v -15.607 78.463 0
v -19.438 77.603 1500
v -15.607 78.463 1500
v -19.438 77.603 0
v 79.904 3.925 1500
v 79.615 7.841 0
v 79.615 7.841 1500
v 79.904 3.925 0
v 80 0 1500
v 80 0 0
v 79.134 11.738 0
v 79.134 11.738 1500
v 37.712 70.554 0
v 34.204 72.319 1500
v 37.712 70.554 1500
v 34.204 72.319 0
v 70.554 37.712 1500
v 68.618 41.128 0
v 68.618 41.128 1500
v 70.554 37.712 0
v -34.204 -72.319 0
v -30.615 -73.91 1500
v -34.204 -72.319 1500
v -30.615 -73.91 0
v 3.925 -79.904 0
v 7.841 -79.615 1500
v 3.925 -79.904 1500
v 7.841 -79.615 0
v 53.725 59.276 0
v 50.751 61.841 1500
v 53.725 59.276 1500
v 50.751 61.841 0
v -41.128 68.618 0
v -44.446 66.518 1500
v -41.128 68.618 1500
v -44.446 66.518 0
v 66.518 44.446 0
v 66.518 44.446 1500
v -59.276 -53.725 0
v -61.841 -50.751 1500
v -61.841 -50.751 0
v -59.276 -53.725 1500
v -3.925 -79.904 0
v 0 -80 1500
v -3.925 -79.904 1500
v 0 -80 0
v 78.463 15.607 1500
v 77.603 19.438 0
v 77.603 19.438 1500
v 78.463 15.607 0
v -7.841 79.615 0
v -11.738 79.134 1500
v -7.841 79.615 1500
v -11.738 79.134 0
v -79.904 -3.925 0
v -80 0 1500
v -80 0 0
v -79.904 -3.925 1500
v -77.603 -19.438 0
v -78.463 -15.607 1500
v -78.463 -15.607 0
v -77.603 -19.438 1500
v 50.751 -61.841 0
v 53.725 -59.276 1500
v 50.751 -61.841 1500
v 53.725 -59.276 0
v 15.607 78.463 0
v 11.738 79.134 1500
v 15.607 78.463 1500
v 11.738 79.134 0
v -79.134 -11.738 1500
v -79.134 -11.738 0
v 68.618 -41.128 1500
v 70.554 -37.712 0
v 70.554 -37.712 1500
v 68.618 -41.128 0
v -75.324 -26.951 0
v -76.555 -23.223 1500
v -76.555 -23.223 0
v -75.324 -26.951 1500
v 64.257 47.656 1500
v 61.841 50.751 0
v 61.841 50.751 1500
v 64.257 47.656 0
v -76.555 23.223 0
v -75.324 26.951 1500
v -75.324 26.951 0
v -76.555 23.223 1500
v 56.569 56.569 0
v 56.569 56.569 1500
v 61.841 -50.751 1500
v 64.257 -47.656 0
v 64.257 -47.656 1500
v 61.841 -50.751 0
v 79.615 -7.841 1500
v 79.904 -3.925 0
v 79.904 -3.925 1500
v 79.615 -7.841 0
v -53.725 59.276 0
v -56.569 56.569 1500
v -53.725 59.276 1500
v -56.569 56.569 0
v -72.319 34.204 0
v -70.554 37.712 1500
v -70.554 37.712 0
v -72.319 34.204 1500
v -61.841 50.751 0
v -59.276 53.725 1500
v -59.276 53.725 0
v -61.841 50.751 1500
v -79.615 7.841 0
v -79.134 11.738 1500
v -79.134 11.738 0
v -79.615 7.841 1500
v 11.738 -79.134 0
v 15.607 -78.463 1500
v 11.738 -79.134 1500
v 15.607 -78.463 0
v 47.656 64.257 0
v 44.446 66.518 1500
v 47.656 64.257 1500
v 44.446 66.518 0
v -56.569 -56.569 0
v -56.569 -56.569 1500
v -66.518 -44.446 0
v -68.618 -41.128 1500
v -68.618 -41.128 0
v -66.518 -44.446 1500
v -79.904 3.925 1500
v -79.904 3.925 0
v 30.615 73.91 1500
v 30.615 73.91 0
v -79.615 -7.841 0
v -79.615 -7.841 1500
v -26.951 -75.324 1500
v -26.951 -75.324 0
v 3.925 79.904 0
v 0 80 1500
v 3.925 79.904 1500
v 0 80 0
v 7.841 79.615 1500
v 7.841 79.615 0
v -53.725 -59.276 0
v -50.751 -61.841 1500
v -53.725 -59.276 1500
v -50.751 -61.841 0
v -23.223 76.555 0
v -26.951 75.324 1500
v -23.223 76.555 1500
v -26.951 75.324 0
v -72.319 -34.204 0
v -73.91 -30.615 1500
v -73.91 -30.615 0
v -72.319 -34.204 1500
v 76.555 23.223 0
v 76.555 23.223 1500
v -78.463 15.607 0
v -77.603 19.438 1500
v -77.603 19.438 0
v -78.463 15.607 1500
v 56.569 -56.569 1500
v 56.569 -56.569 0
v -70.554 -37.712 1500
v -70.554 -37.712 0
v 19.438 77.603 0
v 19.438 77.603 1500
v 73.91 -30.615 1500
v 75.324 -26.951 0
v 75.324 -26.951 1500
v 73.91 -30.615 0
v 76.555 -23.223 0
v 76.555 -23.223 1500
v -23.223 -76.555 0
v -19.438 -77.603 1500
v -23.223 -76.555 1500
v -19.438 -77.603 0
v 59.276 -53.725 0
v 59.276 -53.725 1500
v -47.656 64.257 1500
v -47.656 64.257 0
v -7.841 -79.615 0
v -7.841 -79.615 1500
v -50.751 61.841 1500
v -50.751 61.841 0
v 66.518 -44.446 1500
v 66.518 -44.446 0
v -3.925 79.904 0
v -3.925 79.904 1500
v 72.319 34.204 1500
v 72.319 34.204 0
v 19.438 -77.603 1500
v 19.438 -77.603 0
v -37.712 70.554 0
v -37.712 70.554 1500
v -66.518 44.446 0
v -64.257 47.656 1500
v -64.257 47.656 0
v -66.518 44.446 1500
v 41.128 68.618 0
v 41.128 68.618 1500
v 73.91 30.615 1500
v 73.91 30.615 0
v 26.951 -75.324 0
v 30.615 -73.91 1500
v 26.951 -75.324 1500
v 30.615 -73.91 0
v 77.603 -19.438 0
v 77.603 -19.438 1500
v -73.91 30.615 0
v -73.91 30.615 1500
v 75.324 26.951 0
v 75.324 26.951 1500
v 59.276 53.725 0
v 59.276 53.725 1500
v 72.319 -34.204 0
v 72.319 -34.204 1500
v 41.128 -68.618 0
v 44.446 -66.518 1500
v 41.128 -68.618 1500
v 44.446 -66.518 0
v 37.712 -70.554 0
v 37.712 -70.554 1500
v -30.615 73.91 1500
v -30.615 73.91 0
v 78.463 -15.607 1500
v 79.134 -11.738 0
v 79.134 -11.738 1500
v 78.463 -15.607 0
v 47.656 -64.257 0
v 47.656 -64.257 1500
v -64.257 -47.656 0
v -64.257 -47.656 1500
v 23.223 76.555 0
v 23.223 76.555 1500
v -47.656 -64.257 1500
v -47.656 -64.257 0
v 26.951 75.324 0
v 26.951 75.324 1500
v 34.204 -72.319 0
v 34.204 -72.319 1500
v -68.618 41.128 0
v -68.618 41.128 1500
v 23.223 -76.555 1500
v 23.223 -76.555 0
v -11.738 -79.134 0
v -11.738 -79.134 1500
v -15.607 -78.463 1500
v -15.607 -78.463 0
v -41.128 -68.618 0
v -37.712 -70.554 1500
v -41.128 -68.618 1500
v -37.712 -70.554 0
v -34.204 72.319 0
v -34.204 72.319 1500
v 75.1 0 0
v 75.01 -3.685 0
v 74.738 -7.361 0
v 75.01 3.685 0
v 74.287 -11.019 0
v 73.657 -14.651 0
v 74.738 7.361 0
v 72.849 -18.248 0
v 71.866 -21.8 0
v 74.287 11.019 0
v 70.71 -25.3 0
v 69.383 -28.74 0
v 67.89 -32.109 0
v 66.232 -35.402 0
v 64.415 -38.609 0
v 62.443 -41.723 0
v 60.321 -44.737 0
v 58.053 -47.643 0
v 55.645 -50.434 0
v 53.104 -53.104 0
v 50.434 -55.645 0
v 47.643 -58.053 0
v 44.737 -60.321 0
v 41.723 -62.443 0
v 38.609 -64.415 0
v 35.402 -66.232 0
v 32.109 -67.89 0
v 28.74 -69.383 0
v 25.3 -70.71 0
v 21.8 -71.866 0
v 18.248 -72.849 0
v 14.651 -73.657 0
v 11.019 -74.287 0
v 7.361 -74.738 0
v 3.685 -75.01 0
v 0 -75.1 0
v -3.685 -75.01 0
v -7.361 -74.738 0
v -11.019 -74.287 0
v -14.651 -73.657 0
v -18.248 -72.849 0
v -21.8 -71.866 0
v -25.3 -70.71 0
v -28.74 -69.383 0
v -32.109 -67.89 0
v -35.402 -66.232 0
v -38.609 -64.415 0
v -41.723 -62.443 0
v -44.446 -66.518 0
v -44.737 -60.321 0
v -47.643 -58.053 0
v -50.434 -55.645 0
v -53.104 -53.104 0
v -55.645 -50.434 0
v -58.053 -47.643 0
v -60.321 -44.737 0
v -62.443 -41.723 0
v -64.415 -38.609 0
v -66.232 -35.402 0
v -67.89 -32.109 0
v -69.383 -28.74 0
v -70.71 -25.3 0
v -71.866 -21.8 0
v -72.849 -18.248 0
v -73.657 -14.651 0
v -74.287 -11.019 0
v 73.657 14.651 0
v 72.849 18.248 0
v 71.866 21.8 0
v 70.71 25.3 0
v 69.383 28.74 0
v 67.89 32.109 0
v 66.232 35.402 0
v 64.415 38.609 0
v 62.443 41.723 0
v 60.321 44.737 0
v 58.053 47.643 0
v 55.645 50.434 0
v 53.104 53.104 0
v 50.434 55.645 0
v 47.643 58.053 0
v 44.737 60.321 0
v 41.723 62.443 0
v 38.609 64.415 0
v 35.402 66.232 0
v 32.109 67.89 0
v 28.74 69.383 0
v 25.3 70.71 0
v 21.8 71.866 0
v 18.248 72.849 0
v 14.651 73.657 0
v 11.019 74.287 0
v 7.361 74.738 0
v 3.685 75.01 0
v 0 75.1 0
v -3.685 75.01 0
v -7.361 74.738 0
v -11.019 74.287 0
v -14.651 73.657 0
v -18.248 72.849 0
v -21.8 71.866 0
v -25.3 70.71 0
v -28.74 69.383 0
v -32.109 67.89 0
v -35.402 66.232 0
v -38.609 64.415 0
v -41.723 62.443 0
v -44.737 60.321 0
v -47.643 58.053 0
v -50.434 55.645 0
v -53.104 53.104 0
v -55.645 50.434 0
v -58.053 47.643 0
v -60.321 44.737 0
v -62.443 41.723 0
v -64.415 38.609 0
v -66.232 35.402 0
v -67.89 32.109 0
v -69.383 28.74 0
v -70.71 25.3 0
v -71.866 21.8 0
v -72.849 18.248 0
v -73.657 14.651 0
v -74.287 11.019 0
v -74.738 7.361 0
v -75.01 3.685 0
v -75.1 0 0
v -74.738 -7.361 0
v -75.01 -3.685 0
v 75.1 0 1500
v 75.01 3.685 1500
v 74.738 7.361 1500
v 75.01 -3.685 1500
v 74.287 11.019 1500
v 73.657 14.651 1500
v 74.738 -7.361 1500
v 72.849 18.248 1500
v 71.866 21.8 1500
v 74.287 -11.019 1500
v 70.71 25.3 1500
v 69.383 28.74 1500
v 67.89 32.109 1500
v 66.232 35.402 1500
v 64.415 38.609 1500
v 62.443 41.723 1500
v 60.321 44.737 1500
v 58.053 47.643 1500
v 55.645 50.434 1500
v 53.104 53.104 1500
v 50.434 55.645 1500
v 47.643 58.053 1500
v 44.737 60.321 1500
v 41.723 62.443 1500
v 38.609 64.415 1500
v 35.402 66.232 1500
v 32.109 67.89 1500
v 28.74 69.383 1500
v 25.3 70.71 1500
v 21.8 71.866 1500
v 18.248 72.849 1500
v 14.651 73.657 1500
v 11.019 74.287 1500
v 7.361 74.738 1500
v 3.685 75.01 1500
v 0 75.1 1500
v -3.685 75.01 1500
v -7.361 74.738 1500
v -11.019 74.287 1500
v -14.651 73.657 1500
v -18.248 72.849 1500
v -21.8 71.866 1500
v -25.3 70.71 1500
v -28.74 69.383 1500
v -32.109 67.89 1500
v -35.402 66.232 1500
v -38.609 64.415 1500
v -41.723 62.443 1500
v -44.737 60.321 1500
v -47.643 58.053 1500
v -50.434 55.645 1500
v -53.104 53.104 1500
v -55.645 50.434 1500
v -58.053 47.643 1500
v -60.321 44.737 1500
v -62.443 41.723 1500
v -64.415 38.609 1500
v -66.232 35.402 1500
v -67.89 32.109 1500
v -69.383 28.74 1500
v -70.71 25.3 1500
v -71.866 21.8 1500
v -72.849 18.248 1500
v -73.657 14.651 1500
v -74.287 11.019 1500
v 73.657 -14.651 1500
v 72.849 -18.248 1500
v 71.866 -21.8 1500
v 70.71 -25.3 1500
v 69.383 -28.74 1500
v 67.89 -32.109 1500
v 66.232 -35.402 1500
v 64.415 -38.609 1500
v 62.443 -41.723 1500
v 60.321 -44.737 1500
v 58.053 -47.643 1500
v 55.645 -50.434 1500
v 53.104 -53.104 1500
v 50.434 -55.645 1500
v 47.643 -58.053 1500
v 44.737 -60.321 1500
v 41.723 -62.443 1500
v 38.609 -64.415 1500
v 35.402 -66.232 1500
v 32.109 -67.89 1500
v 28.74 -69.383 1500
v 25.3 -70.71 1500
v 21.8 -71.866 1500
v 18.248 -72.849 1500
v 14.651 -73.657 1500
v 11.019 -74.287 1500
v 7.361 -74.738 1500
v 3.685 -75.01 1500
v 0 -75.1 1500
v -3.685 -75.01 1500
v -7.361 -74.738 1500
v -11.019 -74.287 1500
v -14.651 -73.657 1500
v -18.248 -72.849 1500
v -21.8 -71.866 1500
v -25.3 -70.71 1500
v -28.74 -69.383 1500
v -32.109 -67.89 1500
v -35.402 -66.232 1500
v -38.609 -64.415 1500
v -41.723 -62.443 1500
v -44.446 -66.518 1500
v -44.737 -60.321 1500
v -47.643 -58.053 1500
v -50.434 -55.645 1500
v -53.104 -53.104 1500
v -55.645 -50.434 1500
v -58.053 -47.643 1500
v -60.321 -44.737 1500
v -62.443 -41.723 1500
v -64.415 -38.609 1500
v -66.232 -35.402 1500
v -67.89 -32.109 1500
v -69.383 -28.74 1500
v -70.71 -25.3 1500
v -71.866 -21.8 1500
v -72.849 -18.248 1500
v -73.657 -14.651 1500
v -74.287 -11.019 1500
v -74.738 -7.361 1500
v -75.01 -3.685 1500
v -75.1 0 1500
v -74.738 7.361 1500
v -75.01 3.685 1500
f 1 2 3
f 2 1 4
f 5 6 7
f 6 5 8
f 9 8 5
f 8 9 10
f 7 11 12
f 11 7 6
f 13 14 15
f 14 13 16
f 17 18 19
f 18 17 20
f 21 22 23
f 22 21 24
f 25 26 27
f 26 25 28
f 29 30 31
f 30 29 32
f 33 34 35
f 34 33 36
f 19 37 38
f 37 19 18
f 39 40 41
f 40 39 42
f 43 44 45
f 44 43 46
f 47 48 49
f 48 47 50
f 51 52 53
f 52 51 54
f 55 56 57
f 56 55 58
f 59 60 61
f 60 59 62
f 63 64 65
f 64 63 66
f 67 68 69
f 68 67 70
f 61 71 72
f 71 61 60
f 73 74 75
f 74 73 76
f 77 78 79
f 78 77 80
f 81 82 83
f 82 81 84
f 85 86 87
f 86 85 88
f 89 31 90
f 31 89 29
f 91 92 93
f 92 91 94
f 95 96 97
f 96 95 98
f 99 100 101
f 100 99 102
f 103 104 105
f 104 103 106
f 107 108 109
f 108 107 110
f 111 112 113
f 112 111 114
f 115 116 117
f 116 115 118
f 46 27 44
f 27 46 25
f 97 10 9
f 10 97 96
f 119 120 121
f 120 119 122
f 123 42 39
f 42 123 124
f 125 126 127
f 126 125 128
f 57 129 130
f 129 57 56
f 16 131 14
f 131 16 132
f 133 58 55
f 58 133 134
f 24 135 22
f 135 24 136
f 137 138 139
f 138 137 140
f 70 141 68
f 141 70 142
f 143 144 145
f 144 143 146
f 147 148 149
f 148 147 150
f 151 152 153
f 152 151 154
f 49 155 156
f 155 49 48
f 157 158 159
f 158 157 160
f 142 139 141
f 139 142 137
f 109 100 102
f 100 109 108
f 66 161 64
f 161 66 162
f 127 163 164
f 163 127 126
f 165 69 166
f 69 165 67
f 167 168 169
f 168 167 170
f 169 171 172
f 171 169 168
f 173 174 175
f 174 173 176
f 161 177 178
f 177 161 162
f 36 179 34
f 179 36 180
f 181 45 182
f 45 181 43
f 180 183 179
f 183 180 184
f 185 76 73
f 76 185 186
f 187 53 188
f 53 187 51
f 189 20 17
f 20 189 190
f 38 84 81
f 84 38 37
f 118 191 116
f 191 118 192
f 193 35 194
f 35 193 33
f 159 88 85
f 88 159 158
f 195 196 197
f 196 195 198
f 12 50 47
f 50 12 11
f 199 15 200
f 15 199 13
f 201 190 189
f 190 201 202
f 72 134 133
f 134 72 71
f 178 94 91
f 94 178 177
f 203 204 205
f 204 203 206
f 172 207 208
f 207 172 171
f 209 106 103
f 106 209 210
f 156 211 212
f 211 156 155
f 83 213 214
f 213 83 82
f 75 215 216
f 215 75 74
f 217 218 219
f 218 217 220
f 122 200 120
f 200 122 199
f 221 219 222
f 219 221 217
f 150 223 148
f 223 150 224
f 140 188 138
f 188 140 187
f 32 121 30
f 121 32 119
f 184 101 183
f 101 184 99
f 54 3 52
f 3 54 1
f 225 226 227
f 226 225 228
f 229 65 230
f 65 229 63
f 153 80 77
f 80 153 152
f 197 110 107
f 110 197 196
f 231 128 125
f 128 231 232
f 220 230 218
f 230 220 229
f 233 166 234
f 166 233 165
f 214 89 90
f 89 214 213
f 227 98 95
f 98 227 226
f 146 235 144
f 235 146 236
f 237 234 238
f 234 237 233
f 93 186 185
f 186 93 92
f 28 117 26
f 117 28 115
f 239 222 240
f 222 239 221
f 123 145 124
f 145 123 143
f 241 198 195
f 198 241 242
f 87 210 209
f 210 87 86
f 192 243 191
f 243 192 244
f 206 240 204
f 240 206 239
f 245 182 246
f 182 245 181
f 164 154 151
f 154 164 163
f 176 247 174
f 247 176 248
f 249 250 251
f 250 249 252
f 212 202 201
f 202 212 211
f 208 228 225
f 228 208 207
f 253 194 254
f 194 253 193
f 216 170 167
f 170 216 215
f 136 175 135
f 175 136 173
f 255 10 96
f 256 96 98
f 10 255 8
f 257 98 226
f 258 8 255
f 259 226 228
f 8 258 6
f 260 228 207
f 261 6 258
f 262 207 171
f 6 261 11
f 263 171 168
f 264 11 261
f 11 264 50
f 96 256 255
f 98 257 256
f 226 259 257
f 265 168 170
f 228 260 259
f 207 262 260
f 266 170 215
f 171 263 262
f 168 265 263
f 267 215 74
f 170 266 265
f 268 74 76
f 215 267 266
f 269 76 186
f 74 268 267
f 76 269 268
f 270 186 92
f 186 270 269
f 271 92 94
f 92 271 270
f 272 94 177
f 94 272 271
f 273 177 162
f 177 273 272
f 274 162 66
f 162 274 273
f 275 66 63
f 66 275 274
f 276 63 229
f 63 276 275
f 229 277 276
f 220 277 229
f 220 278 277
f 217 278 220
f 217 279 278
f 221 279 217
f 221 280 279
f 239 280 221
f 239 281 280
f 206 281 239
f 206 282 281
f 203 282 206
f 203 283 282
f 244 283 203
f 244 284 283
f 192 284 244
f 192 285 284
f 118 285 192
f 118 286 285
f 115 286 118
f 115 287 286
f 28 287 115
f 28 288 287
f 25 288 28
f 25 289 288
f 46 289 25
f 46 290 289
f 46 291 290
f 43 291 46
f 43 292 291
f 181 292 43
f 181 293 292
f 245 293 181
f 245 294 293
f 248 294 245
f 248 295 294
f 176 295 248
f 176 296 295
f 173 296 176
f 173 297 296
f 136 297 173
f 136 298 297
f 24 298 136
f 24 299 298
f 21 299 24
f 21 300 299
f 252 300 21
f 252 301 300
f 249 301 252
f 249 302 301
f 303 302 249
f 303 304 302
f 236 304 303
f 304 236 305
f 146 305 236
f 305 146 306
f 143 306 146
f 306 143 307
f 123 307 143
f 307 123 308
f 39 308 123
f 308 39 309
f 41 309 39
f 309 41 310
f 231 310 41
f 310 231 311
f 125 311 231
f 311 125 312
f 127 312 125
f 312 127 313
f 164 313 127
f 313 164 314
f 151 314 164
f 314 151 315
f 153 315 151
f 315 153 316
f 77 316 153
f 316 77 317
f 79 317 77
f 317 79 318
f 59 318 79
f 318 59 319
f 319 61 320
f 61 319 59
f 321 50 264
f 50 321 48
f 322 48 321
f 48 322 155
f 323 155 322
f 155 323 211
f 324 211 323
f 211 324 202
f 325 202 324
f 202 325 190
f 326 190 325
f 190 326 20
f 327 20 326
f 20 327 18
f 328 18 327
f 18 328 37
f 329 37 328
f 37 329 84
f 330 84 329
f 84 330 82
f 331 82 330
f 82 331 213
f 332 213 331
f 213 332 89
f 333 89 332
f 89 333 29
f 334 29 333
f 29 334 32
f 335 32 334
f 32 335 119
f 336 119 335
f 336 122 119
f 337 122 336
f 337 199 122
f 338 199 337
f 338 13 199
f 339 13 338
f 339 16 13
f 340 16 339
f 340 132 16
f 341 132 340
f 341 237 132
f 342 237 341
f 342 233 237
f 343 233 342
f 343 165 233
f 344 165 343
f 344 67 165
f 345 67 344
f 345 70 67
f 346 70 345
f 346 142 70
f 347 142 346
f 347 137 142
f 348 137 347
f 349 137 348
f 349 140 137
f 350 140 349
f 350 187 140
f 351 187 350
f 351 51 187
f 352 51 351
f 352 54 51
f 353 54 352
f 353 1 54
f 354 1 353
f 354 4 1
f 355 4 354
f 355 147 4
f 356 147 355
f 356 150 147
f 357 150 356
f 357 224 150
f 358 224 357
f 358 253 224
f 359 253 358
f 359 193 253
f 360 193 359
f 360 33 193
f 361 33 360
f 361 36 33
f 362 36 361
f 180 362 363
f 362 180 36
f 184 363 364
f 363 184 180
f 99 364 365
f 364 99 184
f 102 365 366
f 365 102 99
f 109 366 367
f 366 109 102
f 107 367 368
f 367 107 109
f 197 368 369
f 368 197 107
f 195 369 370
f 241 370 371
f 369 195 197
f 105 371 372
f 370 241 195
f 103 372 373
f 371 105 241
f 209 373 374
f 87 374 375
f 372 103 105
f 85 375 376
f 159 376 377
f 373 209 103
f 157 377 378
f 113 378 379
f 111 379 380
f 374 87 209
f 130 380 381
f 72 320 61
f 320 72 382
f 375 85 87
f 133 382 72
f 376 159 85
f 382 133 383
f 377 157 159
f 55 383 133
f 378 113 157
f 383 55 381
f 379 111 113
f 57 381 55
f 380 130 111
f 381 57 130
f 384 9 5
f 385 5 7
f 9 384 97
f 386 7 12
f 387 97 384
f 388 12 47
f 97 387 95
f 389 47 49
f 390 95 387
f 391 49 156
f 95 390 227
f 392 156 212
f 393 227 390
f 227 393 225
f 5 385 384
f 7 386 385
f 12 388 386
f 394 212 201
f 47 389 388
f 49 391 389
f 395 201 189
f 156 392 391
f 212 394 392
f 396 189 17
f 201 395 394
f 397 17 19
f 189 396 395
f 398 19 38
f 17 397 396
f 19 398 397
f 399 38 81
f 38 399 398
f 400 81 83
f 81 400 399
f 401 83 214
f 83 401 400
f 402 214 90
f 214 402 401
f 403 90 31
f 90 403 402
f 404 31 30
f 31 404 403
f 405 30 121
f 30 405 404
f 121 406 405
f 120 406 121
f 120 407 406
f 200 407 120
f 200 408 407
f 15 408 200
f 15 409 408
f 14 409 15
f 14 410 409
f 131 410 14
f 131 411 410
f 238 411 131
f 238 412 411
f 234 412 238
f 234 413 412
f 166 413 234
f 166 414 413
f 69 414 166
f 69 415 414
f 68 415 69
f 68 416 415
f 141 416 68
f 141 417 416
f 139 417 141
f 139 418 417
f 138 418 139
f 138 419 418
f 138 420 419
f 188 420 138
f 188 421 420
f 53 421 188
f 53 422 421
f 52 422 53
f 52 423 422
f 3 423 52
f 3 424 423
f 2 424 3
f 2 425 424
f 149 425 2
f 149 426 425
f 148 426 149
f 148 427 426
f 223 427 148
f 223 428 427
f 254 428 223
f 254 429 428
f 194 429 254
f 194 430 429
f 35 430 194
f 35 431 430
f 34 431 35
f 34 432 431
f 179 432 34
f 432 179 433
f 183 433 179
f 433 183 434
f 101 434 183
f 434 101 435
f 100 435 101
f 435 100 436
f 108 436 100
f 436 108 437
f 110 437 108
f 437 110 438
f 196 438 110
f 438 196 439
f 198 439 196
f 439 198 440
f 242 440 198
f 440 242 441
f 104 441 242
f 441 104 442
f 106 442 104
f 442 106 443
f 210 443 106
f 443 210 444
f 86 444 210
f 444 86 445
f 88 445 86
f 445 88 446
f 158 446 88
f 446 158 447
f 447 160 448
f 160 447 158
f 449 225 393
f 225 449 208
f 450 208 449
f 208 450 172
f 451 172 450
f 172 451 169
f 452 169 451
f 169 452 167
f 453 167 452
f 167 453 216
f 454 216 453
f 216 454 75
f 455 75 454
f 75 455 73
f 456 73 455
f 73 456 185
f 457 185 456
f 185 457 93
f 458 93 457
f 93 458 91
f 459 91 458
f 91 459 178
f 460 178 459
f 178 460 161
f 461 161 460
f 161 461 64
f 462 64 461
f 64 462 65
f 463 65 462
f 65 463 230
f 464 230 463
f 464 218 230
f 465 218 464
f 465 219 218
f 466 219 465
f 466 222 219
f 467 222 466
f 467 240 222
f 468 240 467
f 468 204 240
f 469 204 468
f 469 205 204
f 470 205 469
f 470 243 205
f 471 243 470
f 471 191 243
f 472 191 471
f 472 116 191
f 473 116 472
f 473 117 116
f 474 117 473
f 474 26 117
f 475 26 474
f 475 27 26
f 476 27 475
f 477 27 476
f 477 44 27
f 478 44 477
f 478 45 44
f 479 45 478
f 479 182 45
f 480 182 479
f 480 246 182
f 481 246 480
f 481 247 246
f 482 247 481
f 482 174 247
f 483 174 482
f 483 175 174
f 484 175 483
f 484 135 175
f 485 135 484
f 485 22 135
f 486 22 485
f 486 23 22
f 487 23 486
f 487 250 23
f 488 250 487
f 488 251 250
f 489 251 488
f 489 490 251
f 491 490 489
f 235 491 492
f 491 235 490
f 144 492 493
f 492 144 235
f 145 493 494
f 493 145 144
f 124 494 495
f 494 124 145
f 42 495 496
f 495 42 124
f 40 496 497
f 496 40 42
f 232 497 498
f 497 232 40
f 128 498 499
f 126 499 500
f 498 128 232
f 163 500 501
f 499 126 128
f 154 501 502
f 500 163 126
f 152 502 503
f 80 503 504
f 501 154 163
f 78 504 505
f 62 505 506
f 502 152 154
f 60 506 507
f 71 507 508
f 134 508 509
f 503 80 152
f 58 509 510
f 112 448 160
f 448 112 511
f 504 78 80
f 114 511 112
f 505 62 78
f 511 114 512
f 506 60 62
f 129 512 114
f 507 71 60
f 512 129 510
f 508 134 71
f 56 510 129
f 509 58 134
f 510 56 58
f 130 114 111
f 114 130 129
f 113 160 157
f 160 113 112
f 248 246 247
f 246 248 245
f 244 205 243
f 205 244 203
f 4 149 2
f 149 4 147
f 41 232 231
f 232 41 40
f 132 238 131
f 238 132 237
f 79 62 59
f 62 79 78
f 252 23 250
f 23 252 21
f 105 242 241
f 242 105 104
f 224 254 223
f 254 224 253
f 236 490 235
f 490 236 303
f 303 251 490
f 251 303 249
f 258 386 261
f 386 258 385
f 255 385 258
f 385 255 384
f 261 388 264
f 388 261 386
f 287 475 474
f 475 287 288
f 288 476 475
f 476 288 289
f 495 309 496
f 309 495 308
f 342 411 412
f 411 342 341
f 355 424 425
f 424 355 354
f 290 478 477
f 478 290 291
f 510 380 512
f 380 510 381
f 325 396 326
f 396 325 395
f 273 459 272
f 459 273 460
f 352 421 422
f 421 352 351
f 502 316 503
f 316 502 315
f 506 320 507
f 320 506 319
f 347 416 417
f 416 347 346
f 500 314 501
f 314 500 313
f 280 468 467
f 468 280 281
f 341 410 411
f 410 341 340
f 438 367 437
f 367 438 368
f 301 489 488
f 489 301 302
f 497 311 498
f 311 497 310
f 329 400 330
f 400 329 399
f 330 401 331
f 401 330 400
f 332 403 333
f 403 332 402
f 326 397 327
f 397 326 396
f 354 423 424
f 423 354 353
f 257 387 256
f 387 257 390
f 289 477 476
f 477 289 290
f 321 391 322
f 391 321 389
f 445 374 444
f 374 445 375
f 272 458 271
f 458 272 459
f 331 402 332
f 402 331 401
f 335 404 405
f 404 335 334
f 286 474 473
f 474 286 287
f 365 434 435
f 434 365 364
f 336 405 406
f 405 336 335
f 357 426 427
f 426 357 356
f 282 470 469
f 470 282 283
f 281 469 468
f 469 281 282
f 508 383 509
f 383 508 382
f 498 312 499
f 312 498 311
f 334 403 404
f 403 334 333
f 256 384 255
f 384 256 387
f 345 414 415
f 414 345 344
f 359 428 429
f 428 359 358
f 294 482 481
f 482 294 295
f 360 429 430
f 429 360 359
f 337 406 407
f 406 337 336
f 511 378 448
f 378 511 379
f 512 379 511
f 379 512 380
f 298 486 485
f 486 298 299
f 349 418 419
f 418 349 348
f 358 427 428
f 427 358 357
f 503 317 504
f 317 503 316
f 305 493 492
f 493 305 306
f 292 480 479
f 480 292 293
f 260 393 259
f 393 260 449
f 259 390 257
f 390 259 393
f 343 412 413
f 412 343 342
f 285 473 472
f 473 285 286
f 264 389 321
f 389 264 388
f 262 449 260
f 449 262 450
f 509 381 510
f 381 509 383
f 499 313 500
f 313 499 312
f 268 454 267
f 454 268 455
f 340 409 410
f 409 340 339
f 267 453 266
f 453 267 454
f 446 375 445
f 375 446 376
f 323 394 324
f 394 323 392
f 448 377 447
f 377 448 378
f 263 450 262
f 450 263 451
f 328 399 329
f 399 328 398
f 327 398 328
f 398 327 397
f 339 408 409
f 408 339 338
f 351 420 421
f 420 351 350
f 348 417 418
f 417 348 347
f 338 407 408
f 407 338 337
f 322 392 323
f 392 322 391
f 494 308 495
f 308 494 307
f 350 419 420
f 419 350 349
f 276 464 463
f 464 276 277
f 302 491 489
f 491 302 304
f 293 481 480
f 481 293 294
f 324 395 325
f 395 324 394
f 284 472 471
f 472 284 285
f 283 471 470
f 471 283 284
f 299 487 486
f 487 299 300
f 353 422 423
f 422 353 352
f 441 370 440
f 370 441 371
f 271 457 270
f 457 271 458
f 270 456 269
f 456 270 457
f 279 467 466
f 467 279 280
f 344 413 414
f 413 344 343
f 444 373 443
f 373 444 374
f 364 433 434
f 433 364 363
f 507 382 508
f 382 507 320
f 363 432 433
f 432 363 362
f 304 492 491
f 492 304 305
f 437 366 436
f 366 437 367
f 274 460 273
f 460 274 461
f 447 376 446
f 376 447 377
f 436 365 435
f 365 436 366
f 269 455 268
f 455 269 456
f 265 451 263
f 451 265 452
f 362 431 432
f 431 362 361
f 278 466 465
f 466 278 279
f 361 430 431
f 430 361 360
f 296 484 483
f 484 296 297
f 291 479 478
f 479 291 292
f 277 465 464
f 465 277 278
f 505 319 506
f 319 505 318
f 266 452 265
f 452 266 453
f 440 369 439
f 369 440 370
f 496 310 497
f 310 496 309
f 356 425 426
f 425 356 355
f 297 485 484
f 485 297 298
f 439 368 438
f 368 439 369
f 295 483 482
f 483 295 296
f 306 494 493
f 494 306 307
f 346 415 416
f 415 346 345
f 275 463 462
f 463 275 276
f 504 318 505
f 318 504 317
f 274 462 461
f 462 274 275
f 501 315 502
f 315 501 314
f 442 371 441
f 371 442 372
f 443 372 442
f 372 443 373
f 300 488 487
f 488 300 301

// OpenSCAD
$fn=128;

// HT pipe parameters (approximation)
outer_d = 160;      // mm (nominal outer diameter)
length  = 1500;     // mm
wall    = 4.9;      // mm (typical for HT DN160; adjust if needed)

inner_d = outer_d - 2*wall;

difference() {
  cylinder(h=length, d=outer_d, center=false);
  translate([0,0,-0.1])
    cylinder(h=length+0.2, d=inner_d, center=false);
}
